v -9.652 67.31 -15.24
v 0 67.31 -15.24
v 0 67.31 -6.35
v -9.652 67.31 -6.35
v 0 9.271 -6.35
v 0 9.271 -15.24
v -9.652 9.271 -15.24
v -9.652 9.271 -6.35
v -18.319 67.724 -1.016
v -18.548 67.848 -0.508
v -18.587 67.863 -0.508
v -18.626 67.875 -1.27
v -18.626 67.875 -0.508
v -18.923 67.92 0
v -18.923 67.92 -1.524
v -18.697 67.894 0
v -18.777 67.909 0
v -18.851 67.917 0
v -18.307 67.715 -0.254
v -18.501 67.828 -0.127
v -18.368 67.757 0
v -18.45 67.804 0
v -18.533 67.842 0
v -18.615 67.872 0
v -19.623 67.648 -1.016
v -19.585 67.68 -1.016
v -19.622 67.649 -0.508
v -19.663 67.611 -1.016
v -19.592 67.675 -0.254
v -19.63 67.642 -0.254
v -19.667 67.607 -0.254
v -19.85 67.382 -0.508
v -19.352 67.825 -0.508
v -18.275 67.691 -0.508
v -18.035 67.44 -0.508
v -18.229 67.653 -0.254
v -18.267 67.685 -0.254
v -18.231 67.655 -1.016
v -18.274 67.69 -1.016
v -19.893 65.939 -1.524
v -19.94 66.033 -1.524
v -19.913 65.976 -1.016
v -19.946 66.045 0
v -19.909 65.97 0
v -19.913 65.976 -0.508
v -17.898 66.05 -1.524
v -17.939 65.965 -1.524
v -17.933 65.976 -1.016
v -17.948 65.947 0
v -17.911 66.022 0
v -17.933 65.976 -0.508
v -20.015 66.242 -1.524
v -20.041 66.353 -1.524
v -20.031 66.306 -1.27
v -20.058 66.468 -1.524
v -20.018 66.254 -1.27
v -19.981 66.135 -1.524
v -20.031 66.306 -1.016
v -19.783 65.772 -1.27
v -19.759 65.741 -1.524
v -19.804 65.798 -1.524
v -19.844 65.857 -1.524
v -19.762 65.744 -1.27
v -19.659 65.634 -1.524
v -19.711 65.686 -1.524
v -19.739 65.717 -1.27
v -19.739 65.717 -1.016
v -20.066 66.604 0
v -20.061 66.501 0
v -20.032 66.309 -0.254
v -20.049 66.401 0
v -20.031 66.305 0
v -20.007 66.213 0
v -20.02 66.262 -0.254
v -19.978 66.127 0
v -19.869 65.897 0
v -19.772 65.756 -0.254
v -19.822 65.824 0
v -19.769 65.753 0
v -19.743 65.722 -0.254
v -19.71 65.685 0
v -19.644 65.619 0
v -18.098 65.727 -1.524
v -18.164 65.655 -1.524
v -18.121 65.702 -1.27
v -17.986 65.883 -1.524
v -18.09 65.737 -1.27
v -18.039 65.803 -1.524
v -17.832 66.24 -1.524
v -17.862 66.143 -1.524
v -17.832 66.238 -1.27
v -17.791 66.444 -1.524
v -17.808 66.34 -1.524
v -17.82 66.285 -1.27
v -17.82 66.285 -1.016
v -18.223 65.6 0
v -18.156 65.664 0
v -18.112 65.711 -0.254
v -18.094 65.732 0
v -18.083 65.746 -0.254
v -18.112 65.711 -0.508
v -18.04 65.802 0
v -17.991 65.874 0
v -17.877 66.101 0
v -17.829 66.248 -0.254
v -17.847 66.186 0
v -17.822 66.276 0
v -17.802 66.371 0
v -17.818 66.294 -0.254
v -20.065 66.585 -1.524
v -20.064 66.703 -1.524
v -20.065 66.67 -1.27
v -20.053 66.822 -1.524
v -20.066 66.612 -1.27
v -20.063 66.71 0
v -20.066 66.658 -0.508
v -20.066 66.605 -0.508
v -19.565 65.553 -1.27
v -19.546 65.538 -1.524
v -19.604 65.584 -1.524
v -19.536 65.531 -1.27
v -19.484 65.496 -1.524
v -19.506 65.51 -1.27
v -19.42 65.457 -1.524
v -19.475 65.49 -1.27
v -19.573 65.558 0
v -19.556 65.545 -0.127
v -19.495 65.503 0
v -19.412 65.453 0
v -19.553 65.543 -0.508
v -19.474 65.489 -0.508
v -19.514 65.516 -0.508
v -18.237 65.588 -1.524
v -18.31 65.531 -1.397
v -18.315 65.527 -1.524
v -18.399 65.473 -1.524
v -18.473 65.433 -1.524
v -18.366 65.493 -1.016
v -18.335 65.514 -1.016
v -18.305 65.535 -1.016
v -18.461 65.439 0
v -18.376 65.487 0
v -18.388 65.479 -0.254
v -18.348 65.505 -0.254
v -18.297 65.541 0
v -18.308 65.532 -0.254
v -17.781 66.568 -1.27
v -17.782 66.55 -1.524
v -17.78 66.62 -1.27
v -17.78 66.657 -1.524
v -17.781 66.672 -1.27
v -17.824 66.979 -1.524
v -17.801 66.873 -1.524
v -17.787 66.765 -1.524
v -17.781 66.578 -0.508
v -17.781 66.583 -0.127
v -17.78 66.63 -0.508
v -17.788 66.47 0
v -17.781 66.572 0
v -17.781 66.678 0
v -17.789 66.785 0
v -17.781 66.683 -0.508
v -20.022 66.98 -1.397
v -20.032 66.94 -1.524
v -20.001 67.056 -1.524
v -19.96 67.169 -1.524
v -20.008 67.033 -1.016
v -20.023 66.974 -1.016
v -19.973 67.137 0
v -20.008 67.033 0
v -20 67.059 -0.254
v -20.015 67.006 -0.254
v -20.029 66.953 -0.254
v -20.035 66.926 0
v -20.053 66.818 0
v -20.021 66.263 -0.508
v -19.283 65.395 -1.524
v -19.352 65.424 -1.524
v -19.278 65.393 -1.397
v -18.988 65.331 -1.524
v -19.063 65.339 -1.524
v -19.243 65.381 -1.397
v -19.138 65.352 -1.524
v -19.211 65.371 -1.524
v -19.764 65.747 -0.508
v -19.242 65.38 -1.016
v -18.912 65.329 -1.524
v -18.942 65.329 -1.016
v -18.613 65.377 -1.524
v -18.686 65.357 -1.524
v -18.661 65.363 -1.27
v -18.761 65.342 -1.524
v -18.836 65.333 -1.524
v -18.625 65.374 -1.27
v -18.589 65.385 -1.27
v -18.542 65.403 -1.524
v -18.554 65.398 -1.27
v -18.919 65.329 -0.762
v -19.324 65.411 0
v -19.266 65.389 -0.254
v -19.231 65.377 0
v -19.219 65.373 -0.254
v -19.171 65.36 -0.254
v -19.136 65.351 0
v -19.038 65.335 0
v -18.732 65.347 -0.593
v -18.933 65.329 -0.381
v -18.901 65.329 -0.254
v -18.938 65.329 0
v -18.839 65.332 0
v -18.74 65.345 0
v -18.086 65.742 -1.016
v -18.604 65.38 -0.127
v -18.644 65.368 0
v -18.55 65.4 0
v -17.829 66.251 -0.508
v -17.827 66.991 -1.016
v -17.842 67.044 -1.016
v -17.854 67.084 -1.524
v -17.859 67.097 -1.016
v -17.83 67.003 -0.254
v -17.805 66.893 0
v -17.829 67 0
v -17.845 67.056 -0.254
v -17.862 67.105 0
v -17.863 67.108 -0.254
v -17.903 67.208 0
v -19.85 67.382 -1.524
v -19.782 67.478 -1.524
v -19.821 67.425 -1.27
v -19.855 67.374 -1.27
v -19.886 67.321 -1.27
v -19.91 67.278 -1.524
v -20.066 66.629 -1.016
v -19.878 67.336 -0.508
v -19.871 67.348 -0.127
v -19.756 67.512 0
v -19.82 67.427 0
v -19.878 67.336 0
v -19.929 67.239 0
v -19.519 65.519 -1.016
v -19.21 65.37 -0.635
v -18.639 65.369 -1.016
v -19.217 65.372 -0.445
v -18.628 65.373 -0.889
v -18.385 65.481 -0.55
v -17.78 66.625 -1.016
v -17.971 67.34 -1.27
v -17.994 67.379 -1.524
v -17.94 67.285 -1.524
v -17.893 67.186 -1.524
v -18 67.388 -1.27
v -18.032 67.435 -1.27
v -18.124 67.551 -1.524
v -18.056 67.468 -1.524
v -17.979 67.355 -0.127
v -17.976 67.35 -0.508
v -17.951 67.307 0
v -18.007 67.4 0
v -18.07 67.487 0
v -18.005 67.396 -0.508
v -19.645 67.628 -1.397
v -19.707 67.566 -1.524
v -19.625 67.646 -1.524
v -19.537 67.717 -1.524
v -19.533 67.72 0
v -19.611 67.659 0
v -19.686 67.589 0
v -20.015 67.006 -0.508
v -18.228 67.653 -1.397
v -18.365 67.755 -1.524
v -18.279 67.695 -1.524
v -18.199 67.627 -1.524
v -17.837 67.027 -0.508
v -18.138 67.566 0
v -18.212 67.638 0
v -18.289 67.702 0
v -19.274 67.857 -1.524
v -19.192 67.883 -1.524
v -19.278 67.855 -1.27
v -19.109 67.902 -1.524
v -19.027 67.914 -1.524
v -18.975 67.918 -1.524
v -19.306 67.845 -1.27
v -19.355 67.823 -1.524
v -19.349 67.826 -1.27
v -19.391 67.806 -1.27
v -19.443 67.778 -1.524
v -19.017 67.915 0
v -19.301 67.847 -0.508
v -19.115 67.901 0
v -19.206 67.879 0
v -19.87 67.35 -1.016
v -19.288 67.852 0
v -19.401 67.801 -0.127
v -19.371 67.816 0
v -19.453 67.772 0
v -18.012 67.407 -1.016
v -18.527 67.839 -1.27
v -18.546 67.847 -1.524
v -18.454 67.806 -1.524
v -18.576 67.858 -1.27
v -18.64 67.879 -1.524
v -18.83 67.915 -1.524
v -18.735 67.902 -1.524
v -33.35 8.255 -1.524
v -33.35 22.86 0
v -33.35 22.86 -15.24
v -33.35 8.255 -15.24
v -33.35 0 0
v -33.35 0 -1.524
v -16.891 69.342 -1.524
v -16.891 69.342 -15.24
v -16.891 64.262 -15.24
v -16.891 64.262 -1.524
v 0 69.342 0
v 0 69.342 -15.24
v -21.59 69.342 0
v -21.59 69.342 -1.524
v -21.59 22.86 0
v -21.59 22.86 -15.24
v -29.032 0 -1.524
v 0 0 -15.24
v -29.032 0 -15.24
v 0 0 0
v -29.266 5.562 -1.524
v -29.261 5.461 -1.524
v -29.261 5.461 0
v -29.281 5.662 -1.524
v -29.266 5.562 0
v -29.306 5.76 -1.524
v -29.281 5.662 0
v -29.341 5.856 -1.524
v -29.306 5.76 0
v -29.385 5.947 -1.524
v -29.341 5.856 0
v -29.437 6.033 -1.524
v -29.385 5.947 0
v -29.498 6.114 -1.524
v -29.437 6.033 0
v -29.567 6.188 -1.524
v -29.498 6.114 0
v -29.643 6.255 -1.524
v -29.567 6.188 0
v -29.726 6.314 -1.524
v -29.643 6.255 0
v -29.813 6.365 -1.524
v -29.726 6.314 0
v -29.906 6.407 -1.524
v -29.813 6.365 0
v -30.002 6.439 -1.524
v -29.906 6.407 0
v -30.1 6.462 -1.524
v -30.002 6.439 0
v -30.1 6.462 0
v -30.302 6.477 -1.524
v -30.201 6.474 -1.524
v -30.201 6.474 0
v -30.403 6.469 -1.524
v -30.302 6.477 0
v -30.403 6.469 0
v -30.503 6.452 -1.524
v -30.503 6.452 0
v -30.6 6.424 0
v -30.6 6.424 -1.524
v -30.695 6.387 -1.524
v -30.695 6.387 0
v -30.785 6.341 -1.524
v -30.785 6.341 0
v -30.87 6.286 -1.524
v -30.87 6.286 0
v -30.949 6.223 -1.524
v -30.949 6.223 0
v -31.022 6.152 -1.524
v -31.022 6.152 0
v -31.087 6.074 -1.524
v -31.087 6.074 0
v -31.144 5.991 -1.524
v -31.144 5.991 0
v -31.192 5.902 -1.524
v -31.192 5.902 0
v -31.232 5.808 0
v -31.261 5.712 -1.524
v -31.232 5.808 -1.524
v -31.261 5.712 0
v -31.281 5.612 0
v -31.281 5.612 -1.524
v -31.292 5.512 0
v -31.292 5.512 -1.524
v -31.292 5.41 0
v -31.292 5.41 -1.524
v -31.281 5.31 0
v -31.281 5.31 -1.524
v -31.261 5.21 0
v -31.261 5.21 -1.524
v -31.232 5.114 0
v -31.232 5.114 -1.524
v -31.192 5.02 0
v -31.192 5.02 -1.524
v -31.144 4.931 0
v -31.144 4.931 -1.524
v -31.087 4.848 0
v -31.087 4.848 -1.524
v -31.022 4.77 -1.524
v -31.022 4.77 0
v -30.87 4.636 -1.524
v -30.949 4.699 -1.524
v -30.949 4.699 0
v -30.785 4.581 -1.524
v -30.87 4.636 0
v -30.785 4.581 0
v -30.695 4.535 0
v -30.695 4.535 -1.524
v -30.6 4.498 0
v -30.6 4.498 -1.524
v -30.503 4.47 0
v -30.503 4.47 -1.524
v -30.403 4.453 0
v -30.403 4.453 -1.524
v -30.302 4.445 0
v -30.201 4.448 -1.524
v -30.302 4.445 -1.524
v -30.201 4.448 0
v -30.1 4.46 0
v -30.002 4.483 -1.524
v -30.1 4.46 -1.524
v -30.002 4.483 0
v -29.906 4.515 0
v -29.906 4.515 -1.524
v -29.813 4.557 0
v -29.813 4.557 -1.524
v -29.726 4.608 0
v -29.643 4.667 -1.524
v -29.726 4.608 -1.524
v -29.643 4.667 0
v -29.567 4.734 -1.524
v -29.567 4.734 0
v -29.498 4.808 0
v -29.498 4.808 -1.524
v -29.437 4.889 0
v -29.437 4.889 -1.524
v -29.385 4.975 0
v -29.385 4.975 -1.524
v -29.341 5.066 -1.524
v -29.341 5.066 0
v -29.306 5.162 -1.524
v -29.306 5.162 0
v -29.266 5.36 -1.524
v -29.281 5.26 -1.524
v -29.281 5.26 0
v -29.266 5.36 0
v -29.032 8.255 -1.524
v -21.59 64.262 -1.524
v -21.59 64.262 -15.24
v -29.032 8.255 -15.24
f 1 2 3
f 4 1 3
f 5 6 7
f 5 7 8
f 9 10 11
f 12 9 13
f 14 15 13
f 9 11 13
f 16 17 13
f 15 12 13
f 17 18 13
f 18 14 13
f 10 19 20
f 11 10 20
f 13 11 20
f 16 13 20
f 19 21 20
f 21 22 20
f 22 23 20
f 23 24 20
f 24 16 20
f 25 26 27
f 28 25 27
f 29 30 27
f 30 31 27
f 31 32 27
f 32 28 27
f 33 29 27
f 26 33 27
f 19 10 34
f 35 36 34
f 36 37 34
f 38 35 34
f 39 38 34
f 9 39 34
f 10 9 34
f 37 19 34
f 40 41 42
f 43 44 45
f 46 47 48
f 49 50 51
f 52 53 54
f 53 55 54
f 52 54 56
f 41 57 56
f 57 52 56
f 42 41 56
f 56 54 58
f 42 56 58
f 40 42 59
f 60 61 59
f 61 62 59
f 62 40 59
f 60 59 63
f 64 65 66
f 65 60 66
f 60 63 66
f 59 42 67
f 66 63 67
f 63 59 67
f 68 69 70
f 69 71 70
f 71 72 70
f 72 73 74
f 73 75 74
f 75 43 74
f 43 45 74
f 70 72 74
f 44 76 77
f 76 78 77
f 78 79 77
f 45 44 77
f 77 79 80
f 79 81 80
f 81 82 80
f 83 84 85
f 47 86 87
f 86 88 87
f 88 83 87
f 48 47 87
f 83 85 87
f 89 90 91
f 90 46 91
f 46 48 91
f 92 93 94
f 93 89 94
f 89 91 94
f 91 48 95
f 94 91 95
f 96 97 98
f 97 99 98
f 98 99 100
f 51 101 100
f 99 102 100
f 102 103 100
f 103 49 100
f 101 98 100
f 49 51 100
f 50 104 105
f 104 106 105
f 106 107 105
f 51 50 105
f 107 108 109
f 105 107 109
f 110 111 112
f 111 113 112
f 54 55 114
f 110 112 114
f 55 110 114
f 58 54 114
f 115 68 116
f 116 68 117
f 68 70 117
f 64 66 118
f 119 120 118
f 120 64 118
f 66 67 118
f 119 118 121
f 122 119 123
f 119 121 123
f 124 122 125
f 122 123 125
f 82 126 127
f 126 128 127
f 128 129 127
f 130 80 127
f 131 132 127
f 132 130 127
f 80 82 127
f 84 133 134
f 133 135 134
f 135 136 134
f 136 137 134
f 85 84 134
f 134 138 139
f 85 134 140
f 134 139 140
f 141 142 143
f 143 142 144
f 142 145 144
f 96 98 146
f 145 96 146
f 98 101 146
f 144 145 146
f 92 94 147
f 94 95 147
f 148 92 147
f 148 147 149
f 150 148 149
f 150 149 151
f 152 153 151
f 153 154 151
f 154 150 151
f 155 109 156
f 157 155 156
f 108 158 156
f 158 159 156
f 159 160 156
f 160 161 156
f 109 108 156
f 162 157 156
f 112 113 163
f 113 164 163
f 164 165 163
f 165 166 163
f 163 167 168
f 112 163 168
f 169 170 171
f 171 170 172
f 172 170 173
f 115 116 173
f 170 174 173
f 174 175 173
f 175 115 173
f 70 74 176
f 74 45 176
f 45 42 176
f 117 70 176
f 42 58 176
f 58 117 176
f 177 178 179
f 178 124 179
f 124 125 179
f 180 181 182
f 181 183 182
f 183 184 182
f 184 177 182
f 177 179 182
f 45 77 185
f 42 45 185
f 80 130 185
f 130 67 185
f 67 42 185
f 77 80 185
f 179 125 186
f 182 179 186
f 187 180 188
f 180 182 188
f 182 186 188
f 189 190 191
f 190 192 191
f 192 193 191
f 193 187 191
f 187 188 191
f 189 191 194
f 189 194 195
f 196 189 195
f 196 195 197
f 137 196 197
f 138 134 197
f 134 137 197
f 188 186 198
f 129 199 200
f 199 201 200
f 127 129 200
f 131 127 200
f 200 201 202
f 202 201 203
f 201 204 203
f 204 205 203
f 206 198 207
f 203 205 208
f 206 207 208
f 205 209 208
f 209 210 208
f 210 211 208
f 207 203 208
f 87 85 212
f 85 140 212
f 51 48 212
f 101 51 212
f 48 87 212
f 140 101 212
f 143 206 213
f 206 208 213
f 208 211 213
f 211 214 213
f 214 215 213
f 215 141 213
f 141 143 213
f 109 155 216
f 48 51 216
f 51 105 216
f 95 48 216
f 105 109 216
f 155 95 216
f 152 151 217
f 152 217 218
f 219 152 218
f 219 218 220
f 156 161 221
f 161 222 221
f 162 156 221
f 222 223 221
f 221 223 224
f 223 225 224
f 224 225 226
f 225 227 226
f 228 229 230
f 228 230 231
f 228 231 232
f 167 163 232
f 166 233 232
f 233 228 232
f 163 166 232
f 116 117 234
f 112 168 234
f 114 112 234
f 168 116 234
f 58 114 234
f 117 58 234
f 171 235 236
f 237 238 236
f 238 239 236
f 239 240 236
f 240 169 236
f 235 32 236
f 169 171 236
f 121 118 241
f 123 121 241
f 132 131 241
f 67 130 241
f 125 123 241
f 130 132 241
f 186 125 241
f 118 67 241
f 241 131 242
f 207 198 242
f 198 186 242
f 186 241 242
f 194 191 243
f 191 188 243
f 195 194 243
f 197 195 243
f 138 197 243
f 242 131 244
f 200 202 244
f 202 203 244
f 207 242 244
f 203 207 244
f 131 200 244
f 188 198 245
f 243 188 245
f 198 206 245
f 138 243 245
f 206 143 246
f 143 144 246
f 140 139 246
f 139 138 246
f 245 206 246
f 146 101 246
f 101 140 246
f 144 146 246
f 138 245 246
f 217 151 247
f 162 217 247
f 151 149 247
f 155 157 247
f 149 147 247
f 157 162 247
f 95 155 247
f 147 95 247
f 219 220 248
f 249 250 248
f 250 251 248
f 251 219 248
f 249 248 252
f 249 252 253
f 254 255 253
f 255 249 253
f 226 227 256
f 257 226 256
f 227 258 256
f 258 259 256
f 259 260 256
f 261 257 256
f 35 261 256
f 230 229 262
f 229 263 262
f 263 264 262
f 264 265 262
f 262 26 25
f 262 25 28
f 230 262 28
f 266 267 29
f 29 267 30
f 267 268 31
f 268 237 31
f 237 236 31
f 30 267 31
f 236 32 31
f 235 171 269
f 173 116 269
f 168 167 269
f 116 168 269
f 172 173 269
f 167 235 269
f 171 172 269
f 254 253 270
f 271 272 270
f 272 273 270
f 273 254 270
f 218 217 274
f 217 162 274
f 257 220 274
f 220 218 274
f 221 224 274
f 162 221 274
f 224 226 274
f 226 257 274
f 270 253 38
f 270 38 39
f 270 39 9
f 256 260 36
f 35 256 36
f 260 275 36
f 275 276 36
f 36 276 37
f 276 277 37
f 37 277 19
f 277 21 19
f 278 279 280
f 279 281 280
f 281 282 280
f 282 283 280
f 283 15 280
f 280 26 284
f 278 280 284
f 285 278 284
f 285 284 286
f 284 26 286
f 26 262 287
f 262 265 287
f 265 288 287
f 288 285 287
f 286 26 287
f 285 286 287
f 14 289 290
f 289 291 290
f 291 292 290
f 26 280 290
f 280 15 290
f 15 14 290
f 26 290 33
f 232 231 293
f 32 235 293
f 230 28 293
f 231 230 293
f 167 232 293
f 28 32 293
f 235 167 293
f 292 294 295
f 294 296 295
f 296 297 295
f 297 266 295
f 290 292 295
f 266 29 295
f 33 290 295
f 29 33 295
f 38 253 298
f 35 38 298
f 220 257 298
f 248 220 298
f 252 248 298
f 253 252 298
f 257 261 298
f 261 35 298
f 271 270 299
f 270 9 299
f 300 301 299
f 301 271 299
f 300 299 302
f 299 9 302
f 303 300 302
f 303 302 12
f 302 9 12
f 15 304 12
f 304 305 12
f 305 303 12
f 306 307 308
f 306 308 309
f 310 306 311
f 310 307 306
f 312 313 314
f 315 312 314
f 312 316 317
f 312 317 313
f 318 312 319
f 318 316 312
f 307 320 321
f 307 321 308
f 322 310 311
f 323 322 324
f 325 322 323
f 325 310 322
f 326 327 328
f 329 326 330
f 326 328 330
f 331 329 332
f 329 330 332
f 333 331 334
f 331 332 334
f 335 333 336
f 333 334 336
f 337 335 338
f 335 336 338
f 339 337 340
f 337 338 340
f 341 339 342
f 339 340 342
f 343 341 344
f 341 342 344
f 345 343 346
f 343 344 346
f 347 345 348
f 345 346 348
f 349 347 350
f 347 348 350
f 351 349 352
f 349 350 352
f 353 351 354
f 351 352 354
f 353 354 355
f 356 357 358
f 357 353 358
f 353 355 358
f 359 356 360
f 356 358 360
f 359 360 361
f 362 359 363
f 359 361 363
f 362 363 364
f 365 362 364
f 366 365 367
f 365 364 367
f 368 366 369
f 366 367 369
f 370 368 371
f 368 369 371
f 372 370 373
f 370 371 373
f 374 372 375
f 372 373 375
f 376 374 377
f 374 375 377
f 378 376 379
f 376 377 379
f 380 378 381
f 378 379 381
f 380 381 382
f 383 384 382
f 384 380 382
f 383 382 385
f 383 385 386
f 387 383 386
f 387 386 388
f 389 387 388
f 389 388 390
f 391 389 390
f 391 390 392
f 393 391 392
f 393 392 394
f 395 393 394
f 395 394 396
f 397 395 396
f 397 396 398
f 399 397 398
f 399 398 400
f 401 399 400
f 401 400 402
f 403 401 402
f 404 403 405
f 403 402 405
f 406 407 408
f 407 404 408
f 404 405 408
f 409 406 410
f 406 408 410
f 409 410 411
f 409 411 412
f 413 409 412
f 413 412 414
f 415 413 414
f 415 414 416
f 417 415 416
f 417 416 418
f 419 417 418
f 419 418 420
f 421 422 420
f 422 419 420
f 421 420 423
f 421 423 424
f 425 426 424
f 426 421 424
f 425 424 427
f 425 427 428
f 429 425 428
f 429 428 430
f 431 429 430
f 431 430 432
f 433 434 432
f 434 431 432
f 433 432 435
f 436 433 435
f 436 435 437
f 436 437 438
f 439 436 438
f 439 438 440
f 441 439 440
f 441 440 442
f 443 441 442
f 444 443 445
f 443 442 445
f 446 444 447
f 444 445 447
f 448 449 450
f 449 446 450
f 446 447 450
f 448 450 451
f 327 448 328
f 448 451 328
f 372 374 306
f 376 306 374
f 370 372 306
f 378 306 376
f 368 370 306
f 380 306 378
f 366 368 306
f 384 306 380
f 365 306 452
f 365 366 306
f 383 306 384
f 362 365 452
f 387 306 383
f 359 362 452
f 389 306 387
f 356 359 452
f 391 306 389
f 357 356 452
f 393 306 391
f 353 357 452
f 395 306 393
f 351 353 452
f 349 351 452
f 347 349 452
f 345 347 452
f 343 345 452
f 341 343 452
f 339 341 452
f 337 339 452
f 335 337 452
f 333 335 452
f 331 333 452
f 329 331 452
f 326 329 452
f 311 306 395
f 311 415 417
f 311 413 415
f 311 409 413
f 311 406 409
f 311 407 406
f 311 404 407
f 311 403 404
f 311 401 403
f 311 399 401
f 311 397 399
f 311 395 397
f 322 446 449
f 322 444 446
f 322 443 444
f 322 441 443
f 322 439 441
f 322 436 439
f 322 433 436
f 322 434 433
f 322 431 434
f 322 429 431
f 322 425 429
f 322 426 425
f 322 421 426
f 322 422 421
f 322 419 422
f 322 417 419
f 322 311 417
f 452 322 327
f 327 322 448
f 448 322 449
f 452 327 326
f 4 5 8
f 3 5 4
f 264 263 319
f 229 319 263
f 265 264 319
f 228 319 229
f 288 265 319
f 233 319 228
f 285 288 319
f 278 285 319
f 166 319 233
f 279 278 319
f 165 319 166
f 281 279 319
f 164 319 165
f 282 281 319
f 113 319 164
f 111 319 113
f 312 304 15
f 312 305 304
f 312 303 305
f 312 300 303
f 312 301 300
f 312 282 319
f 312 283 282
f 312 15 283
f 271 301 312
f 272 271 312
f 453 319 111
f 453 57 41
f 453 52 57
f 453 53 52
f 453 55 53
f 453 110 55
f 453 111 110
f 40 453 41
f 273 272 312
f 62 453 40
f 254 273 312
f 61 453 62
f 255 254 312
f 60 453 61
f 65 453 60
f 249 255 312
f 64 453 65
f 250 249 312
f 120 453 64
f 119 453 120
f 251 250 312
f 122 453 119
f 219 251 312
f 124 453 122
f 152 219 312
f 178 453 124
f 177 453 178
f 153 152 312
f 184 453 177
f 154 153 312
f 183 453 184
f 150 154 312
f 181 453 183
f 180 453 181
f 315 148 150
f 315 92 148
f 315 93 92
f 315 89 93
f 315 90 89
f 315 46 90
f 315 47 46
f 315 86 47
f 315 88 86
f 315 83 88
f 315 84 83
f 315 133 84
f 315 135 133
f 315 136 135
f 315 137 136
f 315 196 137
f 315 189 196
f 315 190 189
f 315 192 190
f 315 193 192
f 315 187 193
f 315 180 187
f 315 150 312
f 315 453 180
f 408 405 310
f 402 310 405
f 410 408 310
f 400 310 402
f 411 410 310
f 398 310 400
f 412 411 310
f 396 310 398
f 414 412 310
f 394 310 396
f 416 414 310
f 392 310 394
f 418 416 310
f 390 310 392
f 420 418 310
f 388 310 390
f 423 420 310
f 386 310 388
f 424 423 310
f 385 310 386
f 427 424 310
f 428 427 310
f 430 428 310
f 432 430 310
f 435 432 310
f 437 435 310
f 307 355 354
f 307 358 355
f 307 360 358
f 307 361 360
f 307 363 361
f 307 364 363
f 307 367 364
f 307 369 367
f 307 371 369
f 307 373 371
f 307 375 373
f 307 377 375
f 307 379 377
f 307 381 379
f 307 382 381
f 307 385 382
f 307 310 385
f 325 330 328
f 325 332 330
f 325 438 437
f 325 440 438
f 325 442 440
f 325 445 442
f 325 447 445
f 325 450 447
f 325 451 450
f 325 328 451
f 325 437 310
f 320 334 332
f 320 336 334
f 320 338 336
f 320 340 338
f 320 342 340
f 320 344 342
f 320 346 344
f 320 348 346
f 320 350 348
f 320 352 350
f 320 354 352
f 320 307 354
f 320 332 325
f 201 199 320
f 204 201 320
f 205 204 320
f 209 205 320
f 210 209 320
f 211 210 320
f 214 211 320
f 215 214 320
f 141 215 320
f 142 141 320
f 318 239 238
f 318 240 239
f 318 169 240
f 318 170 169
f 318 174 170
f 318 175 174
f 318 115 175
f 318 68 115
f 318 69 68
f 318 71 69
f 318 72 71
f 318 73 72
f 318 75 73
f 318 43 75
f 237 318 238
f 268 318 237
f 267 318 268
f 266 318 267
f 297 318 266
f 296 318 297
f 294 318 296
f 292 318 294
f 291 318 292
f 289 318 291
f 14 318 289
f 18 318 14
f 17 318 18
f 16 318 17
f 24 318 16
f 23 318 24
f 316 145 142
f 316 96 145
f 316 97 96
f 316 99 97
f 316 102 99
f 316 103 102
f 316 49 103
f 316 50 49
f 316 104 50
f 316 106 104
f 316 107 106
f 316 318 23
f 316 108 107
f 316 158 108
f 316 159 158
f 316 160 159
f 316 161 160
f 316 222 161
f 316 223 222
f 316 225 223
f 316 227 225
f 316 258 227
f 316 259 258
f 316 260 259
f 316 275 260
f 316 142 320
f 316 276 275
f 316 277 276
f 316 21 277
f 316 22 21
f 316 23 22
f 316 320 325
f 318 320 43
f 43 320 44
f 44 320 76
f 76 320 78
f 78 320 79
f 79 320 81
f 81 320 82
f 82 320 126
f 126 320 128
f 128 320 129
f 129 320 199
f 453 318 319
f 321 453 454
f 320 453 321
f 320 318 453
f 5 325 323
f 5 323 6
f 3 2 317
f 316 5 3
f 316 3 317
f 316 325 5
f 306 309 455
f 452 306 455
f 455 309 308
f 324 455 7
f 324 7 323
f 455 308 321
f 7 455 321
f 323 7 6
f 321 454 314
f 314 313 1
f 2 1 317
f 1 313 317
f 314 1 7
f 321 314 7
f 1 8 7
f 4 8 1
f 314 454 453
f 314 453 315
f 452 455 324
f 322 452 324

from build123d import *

# Parameters (mm, degrees)
F0_R     = 1.016
F1_DEPTH = 15.24
F2_W     = 4.318
F2_H     = 8.255
F2_R     = 1.016
F3_DEPTH = 13.716
F4_W     = 4.699
F4_H     = 5.08
F5_DEPTH = 13.716
F6_W     = 58.039
F6_H     = 8.89
F7_DEPTH = 9.652


with BuildPart() as f1:
    # F0 (on Top) → F1 (new body)
    with BuildSketch(Plane.XY):
        Polygon((0, 69.342), (-21.59, 69.342), (-21.59, 22.86), (-33.3502, 22.86), (-33.3502, 9.144), (0, 9.144), align=None)
        with BuildLine():
            add(Edge.make_bspline(
                [(-18.923, 67.9196), (-20.902734, 67.9196), (-19.912867, 65.9765), (-18.923, 64.0334), (-17.933133, 65.9765), (-16.943266, 67.9196), (-18.923, 67.9196)],
                knots=[0, 0, 0, 2.094395, 2.094395, 4.18879, 4.18879, 6.283185, 6.283185, 6.283185], degree=2, weights=[1, 0.5, 1, 0.5, 1, 0.5, 1]))
        make_face(mode=Mode.SUBTRACT)
        Polygon((0, 0), (0, 9.144), (-33.3502, 9.144), (-33.3502, 0), (-21.59, 0), align=None)
        with Locations((-30.2768, 5.461)):
            Circle(F0_R, mode=Mode.SUBTRACT)
    extrude(amount=-F1_DEPTH)

    # F2 (on face) → F3 (cut)
    with BuildSketch(Plane(origin=(0, 0, -15.24), x_dir=(1, 0, 0), z_dir=(0, 0, -1))):
        with Locations((-31.1912, -4.1275)):
            Rectangle(F2_W, F2_H)
        with Locations((-30.2768, -5.461)):
            Circle(F2_R, mode=Mode.SUBTRACT)
    extrude(amount=-F3_DEPTH, mode=Mode.SUBTRACT)

    # F4 (on face) → F5 (cut)
    with BuildSketch(Plane(origin=(0, 0, -15.24), x_dir=(1, 0, 0), z_dir=(0, 0, -1))):
        with Locations((-19.2405, -66.802)):
            Rectangle(F4_W, F4_H)
    extrude(amount=-F5_DEPTH, mode=Mode.SUBTRACT)

    # F6 (on face) → F7 (cut)
    with BuildSketch(Plane.YZ):
        with Locations((38.2905, -10.795)):
            Rectangle(F6_W, F6_H)
    extrude(amount=-F7_DEPTH, mode=Mode.SUBTRACT)


solid = f1.part
